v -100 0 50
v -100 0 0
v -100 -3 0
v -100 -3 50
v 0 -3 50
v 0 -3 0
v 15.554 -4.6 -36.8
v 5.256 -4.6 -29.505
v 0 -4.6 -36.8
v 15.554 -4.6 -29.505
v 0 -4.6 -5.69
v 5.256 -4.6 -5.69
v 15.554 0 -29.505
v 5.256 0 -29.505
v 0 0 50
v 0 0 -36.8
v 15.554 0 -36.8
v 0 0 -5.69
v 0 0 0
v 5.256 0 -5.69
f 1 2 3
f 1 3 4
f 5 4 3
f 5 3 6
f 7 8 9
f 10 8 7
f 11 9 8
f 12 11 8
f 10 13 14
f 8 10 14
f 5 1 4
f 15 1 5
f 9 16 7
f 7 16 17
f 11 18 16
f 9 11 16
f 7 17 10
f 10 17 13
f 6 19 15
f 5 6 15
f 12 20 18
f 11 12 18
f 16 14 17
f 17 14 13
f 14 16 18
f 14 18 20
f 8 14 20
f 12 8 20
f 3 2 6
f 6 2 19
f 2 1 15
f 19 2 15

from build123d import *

# Parameters (mm, degrees)
F0_W     = 100
F0_H     = 50
F1_DEPTH = 3
F3_DEPTH = 4.6


# Not quite as in the source:
# - a feature names something its author has since deleted; it is built from what else it names


with BuildPart() as f1:
    # F0 (on Front) → F1 (new body)
    with BuildSketch(Plane.XZ):
        with Locations((-50, 25)):
            Rectangle(F0_W, F0_H)
    extrude(amount=F1_DEPTH)


with BuildPart() as f3:
    # F2 (on Front) → F3 (new body)
    with BuildSketch(Plane.XZ):
        Polygon((5.2557173185, -5.6901420467), (0, -5.6901420467), (0, -36.7995537817), (15.5540080741, -36.7995537817), (15.5540080741, -29.5049361885), (5.2557173185, -29.5049361885), align=None)
    extrude(amount=F3_DEPTH)


solid = Compound([f1.part, f3.part])
